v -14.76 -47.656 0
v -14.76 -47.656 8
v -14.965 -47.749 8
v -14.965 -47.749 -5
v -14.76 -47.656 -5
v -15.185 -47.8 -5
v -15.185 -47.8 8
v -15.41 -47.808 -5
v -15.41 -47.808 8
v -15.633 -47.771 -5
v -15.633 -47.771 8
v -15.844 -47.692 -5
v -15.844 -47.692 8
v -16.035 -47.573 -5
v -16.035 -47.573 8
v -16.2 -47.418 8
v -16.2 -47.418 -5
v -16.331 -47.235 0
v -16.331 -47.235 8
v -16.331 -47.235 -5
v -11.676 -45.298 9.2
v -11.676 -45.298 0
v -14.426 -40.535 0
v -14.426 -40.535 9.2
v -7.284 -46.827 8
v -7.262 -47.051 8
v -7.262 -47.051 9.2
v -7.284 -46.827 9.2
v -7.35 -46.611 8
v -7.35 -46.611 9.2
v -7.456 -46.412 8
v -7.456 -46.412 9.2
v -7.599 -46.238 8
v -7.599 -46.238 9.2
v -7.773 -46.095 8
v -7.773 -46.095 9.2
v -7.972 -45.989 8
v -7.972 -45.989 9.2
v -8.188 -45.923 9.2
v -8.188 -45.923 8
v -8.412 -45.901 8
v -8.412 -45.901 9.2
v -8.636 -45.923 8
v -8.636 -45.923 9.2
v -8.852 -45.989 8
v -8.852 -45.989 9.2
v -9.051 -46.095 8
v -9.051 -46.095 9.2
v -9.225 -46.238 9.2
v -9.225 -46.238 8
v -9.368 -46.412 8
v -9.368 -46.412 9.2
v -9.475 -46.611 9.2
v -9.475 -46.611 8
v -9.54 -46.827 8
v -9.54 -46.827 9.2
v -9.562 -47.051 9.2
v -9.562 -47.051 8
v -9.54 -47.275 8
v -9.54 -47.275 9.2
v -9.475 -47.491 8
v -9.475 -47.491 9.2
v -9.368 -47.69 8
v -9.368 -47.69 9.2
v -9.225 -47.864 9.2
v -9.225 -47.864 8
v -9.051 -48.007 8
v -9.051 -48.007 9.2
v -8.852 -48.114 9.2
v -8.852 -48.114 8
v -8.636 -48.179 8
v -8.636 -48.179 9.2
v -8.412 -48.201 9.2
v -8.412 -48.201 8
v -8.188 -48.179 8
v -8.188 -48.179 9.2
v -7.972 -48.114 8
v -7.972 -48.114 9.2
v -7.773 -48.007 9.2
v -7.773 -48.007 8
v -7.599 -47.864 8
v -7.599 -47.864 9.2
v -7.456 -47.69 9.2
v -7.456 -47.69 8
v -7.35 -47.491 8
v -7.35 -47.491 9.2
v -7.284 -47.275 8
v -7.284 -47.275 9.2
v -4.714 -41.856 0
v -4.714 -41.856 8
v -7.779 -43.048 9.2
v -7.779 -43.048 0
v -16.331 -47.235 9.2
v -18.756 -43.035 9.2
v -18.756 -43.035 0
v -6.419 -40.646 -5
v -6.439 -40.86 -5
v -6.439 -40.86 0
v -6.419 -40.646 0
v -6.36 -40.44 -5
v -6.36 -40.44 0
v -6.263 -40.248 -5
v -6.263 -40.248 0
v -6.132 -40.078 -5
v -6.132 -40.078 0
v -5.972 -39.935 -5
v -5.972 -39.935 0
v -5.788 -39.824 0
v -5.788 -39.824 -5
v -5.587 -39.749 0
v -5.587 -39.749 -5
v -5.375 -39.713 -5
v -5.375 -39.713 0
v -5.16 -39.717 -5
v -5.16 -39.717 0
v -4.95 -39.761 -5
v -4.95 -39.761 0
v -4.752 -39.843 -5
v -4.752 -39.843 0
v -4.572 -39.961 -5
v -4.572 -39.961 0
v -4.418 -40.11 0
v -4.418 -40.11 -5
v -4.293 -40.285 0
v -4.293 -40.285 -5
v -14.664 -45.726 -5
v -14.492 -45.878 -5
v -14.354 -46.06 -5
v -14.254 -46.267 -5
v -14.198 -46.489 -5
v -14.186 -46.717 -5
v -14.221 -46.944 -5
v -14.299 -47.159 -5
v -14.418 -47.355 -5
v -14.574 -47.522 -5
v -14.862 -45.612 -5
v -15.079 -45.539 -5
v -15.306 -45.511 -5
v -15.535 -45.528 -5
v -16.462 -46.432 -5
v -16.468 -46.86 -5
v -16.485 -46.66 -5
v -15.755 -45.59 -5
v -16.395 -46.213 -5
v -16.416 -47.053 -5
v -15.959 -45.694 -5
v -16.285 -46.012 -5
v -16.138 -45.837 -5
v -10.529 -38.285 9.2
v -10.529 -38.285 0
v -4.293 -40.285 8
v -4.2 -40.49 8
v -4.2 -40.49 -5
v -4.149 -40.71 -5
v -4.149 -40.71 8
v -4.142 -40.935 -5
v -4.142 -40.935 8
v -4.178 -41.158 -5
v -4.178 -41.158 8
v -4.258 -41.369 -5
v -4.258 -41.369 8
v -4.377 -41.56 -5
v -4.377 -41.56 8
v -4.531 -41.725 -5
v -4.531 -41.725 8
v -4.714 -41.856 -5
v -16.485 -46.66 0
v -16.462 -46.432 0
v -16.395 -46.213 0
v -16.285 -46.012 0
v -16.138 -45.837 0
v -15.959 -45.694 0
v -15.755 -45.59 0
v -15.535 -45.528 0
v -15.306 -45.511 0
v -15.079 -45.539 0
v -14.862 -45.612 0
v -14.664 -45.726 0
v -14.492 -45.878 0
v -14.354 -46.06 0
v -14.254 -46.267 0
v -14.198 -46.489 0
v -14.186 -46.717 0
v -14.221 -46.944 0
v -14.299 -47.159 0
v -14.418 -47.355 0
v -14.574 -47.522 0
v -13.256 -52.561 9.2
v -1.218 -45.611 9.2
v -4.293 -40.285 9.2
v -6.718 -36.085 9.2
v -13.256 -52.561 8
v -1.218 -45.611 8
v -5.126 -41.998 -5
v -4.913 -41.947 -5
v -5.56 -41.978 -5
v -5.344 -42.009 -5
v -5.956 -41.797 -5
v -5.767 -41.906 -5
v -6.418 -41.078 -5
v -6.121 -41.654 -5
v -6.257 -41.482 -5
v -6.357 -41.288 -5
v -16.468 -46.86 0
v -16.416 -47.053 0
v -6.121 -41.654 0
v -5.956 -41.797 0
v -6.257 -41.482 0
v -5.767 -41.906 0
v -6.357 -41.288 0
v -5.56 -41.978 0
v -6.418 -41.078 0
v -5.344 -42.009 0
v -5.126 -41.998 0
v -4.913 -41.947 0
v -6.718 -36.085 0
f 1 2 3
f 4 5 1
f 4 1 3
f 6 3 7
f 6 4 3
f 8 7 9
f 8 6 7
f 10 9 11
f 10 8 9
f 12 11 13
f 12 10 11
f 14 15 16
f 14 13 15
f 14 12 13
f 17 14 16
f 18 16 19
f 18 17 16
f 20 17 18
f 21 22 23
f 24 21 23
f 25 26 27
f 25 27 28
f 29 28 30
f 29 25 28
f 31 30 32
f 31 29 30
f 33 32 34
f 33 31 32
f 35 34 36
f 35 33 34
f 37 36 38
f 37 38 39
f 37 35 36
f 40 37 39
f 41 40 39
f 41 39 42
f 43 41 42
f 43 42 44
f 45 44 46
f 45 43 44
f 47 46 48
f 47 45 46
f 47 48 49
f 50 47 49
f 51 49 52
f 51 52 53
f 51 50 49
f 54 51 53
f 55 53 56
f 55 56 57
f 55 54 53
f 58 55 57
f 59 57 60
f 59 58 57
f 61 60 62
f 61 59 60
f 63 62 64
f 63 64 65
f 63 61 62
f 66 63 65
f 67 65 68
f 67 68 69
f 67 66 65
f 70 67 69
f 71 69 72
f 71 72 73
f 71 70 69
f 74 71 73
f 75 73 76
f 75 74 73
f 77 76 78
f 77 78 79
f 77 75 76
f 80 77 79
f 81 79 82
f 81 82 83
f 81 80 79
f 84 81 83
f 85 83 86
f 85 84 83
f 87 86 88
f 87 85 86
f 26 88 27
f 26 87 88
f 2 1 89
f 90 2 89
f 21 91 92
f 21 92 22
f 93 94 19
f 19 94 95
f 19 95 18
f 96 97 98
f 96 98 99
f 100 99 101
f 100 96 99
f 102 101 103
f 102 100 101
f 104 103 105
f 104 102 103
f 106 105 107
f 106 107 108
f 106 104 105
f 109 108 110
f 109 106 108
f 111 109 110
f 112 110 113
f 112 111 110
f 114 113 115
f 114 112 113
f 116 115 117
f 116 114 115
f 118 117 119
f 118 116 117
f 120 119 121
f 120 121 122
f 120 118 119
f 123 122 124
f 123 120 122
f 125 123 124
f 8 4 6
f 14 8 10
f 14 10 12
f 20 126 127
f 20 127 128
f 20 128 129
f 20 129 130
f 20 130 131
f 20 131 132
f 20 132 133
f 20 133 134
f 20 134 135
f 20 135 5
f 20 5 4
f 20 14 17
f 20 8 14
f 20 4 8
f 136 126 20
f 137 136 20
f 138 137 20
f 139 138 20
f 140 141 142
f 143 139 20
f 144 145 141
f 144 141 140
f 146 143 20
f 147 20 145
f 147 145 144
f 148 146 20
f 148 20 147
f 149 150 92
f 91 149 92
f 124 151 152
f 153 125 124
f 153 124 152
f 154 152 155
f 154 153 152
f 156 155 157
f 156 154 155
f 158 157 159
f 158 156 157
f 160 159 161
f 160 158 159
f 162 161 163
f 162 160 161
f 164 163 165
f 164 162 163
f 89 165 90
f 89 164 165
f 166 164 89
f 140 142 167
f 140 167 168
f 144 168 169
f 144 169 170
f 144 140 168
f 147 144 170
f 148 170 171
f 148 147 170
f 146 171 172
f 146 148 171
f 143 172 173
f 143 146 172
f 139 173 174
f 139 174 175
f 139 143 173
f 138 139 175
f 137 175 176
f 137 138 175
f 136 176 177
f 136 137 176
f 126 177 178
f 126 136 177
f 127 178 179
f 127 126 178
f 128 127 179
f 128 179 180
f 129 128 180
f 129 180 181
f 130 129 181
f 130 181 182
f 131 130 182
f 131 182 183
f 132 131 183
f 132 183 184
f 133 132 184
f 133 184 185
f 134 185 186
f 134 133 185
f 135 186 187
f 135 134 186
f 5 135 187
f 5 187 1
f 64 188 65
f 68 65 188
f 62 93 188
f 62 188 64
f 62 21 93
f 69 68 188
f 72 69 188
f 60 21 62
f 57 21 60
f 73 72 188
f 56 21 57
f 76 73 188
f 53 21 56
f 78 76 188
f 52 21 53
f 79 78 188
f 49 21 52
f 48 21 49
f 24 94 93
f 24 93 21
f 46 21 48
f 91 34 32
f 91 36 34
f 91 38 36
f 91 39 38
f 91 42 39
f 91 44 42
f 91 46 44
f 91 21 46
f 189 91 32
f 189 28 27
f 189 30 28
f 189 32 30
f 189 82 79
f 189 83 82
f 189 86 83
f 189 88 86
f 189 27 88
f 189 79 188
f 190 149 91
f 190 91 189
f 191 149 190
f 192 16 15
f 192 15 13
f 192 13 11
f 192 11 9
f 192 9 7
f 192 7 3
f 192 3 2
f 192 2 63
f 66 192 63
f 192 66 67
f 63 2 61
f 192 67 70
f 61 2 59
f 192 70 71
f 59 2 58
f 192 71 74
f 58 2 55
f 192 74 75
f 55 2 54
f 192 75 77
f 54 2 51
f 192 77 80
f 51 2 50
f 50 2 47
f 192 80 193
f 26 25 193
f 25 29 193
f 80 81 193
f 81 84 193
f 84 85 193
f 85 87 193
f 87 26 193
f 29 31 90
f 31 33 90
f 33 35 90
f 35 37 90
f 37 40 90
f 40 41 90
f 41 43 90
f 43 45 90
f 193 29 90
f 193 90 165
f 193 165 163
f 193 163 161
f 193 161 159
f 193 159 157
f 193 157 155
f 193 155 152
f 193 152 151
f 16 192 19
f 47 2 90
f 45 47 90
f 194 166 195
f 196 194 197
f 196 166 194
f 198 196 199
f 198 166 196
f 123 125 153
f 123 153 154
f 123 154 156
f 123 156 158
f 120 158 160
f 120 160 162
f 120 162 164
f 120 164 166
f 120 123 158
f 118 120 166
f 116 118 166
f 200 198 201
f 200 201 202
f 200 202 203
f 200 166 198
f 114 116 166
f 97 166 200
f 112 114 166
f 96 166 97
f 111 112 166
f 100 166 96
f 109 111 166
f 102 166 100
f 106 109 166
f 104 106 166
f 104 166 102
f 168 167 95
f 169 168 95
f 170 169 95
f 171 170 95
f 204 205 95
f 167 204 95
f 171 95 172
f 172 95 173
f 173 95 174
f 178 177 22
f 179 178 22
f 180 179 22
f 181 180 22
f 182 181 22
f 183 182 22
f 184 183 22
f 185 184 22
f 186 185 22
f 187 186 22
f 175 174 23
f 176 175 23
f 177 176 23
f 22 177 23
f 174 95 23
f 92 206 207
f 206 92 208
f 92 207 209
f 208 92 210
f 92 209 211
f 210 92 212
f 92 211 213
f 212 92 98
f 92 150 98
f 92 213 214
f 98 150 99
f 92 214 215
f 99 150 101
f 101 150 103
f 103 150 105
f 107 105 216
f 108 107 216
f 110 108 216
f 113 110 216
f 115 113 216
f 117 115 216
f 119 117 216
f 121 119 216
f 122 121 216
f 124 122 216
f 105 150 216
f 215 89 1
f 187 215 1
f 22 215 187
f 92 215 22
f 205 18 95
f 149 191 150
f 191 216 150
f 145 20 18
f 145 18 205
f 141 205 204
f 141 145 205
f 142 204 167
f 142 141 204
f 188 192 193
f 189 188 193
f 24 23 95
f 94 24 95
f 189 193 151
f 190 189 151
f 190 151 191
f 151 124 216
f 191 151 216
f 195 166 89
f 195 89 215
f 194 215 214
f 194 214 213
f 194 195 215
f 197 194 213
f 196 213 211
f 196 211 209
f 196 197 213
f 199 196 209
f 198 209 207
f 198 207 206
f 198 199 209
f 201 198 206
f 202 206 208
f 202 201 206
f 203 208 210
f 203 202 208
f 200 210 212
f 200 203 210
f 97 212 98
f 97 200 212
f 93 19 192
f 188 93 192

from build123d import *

# Parameters (mm, degrees)
EXTRUSION1_DEPTH = 8
ESQUISSE2_R      = 1.15
EXTRUSION2_DEPTH = 1.2
EXTRUSION3_START = 5
EXTRUSION3_DEPTH = 5


with BuildPart() as part:
    # Esquisse1 → Extrusion1 (new body)
    with BuildSketch(Plane.XY):
        with BuildLine():
            Line((-14.760065323, -47.656078111), (-4.714170639, -41.856078111))
            ThreePointArc((-4.714170639, -41.856078111), (-4.178355938, -41.157790798), (-4.293241424, -40.285148896))
            Line((-4.293241424, -40.285148896), (-6.718241424, -36.084925688))
            Line((-6.718241424, -36.084925688), (-10.528753201, -38.284925688))
            Line((-10.528753201, -38.284925688), (-7.778753201, -43.048065409))
            Line((-7.778753201, -43.048065409), (-11.675867518, -45.298065409))
            Line((-11.675867518, -45.298065409), (-14.425867518, -40.534925688))
            Line((-14.425867518, -40.534925688), (-18.755994537, -43.034925688))
            Line((-18.755994537, -43.034925688), (-16.330994537, -47.235148896))
            ThreePointArc((-16.330994537, -47.235148896), (-15.632707224, -47.770963597), (-14.760065323, -47.656078111))
        make_face()
    extrude(amount=EXTRUSION1_DEPTH)

    # Esquisse2 → Extrusion2 (add)
    with BuildSketch(Plane.XY.offset(8)):
        Polygon((-18.755994537, -43.034925688), (-16.330994537, -47.235148896), (-13.255994537, -52.56120513), (-1.218241424, -45.61120513), (-4.293241424, -40.285148896), (-6.718241424, -36.084925688), (-10.528753201, -38.284925688), (-7.778753201, -43.048065409), (-11.675867518, -45.298065409), (-14.425867518, -40.534925688), align=None)
        with Locations((-8.412117981, -47.051045431)):
            Circle(ESQUISSE2_R, mode=Mode.SUBTRACT)
    extrude(amount=EXTRUSION2_DEPTH)

    # Esquisse3 → Extrusion3 (add)
    with BuildSketch(Plane(origin=(0, 0, 0), x_dir=(-1, 0, 0), z_dir=(0, 0, -1)).offset(EXTRUSION3_START)):
        with BuildLine():
            ThreePointArc((4.714170639, -41.856078111), (5.864170639, -41.856078111), (6.439170639, -40.860148896))
            ThreePointArc((6.439170639, -40.860148896), (5.586812541, -39.749334196), (4.293241424, -40.285148896))
            ThreePointArc((4.293241424, -40.285148896), (4.178355938, -41.157790798), (4.714170639, -41.856078111))
        make_face()
        with BuildLine():
            ThreePointArc((16.330994537, -47.235148896), (16.445880023, -46.957790798), (16.485065323, -46.660148896))
            ThreePointArc((16.485065323, -46.660148896), (14.760065323, -45.664219682), (14.760065323, -47.656078111))
            ThreePointArc((14.760065323, -47.656078111), (15.632707224, -47.770963597), (16.330994537, -47.235148896))
        make_face()
    extrude(amount=-EXTRUSION3_DEPTH)


solid = part.part
